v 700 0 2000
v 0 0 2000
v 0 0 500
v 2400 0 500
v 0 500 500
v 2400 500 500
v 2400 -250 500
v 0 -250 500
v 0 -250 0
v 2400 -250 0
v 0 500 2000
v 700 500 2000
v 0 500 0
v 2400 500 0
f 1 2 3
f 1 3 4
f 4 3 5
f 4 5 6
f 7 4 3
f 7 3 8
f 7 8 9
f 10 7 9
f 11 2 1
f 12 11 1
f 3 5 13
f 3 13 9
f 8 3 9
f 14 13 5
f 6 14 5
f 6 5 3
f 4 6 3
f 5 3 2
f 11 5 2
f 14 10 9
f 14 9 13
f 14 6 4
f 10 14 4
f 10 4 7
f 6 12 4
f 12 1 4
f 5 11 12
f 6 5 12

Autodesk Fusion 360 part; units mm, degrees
sketch "Sketch1" plane through (0, 0, 0) normal (0, 1, 0) x (1, 0, 0)
  line L0 (0, 0) -> (2400, 0)
  line L1 (0, 0) -> (0, -2000)
  line L2 (0, -2000) -> (700, -2000)
  line L3 (2400, 0) -> (2400, -500)
  line L4 (700, -2000) -> (2400, -500)
  dimension "d1" = 2400
  dimension "d2" = 2000
  dimension "d3" = 700
  dimension "d4" = 500
extrude "Extrude1" add sketch "Sketch1" along normal blind 500 makes body 1
move_face "OffsetFaces1" offset -500 1 faces at (800, 166.6667, 0) on bodies 1
sketch "Sketch2" plane through (0, 0, 0) normal (-1, 0, 0) x (0, -1, 0)
  line L0 (0, 500) -> (0, 2000)
  line L1 (0, 2000) -> (-500, 2000)
  line L2 (-500, 2000) -> (-500, 500)
  line L3 (-500, 500) -> (0, 500)
  line L4 (-500, 500) -> (250, 500)
  line L5 (250, 500) -> (250, 0)
  line L6 (250, 0) -> (-500, 0)
  line L7 (-500, 0) -> (-500, 500)
  dimension "d8" = 750
extrude "Extrude2" add sketch "Sketch2" against normal blind 2400 separate body contours L3 L4 L5 L6 L7 makes body 2
